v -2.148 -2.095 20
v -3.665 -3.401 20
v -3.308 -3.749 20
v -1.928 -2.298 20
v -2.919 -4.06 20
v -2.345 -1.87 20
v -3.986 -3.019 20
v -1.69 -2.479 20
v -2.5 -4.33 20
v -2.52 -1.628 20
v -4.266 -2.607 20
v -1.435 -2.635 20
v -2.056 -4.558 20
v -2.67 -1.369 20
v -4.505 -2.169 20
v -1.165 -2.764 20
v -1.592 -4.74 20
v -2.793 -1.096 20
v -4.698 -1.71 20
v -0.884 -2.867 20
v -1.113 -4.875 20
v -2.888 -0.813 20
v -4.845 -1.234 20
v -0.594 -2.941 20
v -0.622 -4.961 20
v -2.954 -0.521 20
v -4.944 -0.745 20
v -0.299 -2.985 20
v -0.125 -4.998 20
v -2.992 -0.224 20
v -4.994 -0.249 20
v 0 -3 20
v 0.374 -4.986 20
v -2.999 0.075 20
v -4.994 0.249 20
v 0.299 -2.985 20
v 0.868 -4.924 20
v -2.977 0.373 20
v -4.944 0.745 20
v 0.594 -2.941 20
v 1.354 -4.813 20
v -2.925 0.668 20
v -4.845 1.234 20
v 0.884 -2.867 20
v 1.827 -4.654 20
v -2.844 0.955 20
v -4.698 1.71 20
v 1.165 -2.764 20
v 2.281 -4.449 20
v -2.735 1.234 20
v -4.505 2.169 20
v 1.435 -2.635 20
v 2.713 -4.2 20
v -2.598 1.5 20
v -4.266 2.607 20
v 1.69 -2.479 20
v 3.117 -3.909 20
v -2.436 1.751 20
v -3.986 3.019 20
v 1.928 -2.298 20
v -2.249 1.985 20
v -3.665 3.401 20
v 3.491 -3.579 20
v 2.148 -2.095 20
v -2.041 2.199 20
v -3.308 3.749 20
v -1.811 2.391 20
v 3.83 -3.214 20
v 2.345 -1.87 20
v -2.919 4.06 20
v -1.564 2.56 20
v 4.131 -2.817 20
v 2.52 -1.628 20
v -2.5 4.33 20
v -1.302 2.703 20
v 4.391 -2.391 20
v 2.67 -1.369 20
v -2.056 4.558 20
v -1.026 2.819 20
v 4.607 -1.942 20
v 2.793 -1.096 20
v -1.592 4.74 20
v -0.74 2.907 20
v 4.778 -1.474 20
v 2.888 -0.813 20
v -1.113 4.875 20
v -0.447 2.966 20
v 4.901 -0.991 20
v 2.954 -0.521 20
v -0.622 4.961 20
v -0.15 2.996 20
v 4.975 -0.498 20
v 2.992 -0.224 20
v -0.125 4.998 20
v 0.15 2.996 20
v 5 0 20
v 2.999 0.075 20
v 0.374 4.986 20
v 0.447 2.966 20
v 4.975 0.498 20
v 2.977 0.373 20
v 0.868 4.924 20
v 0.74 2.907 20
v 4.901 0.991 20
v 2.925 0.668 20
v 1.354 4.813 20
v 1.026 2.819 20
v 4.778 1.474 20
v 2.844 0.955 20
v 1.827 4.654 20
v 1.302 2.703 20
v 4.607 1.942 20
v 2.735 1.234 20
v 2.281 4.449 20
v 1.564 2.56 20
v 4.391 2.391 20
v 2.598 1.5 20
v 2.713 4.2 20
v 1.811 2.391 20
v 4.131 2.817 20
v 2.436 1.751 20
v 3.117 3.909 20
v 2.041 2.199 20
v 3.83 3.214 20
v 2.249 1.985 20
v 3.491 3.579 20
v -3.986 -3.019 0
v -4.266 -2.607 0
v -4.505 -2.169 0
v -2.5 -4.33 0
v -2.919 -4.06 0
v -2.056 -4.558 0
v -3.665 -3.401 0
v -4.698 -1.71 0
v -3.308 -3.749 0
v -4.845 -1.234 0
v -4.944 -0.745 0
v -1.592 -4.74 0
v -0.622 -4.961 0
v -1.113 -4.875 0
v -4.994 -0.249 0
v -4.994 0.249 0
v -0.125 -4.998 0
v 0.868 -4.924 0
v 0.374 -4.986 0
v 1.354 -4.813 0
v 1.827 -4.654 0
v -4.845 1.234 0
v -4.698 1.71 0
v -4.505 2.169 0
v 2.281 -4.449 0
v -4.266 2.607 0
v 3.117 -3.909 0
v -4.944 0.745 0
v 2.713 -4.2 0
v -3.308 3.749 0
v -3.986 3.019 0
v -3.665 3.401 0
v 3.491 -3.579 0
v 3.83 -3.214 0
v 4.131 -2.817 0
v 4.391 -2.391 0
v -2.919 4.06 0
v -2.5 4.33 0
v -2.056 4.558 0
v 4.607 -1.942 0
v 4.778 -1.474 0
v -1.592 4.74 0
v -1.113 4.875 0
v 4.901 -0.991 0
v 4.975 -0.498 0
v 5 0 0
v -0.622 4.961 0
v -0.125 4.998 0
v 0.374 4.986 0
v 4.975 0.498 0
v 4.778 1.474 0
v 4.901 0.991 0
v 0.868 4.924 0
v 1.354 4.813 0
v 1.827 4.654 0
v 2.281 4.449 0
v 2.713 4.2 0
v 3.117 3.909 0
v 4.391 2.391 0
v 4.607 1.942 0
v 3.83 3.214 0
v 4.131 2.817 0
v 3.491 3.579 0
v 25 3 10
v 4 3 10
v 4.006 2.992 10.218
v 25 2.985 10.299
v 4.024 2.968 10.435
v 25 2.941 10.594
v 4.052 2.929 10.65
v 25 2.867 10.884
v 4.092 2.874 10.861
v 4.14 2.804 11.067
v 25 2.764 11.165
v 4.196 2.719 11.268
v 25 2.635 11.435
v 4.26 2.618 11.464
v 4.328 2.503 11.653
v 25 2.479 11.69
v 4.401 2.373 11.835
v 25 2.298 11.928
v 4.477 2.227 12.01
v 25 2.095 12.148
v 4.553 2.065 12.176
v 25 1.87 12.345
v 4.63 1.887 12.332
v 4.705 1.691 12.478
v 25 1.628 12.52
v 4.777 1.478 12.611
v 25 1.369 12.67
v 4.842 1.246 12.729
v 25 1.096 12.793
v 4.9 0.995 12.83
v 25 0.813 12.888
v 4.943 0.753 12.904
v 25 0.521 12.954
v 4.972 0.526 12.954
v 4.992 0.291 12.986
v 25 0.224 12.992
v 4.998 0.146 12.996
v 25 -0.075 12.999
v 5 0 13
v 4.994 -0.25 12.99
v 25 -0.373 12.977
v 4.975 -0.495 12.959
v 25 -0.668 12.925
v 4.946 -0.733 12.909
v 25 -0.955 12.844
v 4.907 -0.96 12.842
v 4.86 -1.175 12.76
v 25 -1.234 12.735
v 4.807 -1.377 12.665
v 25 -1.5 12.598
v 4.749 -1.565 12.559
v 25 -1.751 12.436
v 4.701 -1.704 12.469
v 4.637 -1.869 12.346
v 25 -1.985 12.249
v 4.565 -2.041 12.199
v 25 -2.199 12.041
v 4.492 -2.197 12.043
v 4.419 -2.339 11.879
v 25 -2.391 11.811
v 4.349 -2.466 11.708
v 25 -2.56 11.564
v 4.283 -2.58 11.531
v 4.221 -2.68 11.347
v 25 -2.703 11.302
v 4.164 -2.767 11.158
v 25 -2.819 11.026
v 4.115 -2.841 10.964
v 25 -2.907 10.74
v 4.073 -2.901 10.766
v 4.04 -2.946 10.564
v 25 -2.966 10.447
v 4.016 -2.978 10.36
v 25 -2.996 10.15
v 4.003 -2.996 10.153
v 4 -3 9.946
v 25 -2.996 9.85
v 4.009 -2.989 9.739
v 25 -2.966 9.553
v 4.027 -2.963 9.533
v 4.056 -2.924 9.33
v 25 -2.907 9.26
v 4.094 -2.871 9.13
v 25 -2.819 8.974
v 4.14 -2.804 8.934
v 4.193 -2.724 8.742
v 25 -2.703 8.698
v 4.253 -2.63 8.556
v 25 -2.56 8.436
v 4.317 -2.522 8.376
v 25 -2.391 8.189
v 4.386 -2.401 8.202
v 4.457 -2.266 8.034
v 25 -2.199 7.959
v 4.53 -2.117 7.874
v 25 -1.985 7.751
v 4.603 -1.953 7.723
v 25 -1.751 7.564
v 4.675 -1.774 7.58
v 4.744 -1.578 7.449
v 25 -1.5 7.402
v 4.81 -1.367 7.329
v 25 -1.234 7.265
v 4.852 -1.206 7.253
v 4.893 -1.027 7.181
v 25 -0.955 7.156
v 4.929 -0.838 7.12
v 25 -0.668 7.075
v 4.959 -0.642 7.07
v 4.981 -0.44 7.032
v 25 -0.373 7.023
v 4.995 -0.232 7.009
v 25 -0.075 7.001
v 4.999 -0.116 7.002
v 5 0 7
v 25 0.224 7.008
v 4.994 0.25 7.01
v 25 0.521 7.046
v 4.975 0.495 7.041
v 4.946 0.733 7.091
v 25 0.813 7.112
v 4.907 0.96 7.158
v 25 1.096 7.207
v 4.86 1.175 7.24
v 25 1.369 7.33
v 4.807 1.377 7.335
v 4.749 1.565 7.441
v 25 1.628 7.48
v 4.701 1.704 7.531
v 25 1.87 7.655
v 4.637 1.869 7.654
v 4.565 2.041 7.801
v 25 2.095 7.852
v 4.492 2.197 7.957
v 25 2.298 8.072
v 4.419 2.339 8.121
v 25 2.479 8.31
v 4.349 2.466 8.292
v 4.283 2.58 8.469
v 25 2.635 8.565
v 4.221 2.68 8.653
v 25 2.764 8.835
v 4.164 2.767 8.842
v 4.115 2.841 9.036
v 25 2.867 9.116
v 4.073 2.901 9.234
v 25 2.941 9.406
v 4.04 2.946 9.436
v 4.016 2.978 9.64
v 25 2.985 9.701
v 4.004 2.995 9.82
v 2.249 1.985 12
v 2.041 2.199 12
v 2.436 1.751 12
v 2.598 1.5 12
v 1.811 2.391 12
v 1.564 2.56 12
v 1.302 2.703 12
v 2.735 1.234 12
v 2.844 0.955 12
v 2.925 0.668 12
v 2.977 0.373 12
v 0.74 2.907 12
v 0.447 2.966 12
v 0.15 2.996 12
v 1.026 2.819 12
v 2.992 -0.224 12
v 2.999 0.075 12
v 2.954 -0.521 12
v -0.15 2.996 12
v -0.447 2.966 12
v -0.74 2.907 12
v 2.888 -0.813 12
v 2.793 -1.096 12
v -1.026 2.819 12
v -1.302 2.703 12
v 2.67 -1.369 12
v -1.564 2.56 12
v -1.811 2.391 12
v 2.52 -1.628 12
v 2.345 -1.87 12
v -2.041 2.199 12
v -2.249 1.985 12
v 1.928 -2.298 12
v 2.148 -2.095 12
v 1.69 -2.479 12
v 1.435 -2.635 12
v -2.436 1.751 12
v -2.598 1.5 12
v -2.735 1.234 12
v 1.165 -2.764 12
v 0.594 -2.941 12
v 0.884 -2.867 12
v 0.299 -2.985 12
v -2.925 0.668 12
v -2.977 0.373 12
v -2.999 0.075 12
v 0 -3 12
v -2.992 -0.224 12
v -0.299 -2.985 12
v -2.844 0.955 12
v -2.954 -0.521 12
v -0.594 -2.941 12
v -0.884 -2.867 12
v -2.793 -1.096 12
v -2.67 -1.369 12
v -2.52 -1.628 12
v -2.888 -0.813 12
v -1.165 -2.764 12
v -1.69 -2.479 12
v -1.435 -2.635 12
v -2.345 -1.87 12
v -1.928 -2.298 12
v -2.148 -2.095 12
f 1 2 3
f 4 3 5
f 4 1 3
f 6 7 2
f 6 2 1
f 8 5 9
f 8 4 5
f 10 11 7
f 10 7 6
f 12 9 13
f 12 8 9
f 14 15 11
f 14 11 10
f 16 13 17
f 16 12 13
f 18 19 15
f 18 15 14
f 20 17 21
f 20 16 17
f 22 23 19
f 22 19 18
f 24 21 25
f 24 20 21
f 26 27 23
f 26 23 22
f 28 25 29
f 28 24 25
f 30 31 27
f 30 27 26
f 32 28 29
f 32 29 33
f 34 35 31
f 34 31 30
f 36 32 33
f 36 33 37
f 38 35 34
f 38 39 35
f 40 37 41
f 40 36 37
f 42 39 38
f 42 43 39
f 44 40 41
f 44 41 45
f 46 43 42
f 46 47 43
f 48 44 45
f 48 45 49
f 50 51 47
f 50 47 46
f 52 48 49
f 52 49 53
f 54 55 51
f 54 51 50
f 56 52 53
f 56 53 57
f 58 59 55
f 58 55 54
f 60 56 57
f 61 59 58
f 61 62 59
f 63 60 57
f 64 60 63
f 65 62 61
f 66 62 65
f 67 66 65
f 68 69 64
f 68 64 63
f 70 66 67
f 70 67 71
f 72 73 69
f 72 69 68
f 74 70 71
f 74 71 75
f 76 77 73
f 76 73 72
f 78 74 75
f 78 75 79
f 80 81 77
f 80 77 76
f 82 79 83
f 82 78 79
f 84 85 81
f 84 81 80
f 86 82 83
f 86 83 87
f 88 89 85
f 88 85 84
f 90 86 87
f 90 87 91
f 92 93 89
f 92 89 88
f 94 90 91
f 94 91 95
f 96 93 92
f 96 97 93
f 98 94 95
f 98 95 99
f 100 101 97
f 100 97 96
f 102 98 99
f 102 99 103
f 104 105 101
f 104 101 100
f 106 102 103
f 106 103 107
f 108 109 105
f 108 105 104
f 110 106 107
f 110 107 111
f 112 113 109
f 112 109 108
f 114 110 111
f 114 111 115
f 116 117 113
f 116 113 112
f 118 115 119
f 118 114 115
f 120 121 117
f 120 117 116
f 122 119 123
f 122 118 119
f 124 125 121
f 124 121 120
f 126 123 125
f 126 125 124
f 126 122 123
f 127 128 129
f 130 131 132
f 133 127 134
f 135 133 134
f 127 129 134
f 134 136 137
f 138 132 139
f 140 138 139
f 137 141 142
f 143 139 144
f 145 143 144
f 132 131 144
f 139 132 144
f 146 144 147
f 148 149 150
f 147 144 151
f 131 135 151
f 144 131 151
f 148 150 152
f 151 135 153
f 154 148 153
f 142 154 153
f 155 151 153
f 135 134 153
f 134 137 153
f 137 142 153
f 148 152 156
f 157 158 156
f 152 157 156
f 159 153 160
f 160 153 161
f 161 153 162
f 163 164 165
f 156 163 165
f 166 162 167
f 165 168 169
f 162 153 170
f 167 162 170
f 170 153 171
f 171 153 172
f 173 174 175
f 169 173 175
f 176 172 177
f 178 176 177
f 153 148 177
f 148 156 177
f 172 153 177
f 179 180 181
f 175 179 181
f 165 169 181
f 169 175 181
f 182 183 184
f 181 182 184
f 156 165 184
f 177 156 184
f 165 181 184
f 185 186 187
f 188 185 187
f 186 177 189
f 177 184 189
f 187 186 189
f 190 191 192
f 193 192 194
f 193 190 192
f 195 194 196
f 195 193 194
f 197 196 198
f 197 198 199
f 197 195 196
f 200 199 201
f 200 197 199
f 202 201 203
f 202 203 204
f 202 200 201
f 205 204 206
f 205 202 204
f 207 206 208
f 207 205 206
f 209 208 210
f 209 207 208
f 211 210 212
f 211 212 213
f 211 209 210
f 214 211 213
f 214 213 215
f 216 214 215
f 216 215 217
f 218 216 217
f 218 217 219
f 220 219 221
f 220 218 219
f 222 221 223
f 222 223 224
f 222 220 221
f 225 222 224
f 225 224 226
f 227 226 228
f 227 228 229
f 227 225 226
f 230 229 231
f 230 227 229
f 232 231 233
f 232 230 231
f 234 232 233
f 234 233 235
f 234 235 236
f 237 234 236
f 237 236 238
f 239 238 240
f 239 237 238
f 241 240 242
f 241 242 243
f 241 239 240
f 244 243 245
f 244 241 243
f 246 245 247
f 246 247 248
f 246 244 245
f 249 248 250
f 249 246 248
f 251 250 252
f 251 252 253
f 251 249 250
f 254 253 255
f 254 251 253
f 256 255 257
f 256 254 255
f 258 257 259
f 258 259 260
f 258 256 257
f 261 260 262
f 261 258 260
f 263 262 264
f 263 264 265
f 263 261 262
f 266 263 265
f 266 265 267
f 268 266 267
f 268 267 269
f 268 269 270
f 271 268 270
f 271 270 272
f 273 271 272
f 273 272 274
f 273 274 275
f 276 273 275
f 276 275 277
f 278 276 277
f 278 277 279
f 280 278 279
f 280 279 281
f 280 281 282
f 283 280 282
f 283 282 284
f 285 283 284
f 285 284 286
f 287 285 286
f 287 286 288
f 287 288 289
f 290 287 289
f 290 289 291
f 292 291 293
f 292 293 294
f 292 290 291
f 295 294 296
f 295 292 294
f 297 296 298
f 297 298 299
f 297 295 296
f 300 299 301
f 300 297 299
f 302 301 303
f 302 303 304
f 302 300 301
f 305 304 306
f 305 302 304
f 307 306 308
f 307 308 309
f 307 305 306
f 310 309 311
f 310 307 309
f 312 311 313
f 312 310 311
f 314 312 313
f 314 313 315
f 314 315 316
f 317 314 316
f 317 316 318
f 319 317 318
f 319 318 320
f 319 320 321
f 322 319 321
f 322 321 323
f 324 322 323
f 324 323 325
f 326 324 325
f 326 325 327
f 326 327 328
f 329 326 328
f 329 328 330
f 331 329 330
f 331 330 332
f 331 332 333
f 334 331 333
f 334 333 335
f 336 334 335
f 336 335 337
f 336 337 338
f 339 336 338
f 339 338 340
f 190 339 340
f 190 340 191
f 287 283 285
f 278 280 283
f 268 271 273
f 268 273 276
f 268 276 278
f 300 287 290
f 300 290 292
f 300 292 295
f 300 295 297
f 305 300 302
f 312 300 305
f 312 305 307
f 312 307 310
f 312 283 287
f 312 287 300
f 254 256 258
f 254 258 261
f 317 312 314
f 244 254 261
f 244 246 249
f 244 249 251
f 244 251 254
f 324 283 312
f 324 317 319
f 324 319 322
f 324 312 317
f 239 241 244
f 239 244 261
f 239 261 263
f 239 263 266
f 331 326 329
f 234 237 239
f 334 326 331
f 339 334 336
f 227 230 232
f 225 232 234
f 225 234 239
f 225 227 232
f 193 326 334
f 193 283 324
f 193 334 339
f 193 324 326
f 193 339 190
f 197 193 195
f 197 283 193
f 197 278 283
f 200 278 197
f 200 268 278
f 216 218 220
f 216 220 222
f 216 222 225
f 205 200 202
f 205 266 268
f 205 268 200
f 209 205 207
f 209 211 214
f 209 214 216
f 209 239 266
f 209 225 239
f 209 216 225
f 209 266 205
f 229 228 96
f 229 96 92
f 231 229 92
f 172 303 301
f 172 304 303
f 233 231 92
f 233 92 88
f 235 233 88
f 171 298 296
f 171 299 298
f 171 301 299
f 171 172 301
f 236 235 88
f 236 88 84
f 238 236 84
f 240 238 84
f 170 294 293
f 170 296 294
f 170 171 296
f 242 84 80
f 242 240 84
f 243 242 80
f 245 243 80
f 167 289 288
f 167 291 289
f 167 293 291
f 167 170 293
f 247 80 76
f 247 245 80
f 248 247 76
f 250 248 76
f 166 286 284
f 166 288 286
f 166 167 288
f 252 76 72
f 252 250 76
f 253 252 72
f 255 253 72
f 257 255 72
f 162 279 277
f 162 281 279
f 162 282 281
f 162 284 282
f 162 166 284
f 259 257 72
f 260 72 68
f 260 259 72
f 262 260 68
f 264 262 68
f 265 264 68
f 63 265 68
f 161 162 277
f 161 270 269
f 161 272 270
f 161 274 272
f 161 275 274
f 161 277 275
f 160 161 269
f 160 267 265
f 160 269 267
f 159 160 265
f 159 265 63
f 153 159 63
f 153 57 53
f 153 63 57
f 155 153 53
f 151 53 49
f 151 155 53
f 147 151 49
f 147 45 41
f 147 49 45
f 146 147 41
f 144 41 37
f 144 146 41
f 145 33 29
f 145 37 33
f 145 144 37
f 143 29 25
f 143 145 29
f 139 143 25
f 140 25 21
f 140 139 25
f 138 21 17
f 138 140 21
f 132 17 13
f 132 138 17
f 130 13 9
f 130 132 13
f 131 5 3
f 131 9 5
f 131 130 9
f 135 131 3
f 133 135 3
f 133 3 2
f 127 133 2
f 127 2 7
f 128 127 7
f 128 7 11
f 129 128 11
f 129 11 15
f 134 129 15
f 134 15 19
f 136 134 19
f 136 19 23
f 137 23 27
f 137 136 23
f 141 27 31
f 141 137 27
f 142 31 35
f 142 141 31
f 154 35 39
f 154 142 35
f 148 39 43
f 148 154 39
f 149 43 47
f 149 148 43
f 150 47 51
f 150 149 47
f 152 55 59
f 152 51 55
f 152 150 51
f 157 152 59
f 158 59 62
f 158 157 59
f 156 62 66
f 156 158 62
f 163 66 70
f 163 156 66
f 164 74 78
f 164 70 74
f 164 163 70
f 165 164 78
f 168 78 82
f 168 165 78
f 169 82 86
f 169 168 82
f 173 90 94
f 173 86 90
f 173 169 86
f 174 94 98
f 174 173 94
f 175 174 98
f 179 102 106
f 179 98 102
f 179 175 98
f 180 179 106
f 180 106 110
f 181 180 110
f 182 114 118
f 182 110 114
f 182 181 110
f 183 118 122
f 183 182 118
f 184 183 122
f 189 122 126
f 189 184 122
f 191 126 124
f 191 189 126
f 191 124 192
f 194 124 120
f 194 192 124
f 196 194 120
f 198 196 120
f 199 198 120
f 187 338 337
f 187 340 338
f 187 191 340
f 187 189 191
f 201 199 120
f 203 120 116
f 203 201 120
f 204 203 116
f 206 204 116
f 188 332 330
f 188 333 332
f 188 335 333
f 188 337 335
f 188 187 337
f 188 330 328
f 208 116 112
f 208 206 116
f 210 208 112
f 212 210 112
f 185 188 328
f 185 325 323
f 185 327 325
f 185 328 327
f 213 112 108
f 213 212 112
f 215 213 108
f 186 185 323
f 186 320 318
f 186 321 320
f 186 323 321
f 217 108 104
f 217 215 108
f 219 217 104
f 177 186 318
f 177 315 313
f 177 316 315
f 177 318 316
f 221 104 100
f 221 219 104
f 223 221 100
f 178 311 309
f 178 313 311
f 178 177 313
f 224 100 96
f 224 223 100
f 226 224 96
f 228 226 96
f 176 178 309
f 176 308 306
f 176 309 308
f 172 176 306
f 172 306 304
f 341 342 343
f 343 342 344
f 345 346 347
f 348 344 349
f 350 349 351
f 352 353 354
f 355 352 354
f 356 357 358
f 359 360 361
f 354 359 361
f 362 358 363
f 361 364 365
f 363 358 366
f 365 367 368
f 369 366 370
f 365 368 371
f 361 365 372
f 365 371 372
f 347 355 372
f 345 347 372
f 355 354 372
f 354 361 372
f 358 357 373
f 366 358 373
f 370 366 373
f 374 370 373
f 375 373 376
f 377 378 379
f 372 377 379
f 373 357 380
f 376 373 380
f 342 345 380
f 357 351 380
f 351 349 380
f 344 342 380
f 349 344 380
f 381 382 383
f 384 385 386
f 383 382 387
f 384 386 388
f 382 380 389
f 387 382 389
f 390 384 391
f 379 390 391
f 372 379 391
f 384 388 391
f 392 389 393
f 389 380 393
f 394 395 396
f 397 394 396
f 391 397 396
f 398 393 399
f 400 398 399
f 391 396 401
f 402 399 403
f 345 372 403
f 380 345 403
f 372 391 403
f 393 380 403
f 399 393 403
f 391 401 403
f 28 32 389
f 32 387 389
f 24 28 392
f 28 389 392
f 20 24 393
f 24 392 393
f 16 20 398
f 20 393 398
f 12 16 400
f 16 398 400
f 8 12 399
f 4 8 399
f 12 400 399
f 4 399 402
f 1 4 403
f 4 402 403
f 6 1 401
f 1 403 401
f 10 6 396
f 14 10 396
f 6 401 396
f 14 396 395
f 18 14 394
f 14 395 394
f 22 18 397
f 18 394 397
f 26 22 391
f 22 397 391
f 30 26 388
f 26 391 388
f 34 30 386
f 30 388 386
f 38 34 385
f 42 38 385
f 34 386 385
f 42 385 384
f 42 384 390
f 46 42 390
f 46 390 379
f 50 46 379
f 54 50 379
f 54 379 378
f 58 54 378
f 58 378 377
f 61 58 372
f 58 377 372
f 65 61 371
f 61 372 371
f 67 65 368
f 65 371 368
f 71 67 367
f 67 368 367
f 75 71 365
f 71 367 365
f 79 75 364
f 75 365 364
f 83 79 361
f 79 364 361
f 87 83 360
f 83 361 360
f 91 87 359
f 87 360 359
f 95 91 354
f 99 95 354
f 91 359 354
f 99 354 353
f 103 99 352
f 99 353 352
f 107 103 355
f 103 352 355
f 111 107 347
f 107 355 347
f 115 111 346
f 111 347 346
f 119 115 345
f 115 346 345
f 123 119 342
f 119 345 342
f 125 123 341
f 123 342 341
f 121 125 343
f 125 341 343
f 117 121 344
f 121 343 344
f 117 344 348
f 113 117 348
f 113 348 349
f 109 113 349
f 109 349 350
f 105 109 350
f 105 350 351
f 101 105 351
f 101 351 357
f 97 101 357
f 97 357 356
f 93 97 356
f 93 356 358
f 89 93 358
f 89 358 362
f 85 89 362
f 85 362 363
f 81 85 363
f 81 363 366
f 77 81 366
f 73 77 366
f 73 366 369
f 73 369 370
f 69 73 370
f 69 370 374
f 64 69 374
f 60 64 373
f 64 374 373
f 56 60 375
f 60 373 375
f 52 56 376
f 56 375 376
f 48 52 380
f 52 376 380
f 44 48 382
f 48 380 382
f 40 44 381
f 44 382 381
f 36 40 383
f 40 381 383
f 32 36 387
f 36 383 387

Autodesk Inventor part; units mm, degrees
ref_plane "XZ Plane" through (0, 0, 0) normal (0, 1, 0) x (-1, 0, 0)
ref_plane "XY Plane" through (0, 0, 0) normal (0, 0, 1) x (1, 0, 0)
sketch "Sketch1" plane through (0, 0, 0) normal (0, 0, 1) x (1, 0, 0)
  circle A0 centre (0, 0) radius 5
  dimension "d0" = 10
extrude "Extrusion1" add sketch "Sketch1" along normal blind 20
sketch "Sketch2" plane through (0, 0, 20) normal (0, 0, 1) x (1, 0, 0)
  circle A0 centre (0, 0) radius 5 projected
hole "Hole1" at (0, 0, 20) direction (0, 0, -1) diameter 6 depth 8
ref_plane "Work Plane1" through (25, 0, 0) normal (1, 0, 0) x (0, 1, 0)
sketch "Sketch3" plane through (25, 0, 0) normal (1, 0, 0) x (0, 1, 0)
  circle A0 centre (0, 10) radius 3
  line L0 (-5, 0) -> (-5, 20) projected
  point P0 (0, 0)
  point P1 (-5, 10)
  dimension "d11" = 6
extrude "Extrusion2" add sketch "Sketch3" against normal up to surface
thread "Thread1" size "M6x1" class "6g" standard "ISO Metric profile" length 15
properties part number "verbindungunten"
